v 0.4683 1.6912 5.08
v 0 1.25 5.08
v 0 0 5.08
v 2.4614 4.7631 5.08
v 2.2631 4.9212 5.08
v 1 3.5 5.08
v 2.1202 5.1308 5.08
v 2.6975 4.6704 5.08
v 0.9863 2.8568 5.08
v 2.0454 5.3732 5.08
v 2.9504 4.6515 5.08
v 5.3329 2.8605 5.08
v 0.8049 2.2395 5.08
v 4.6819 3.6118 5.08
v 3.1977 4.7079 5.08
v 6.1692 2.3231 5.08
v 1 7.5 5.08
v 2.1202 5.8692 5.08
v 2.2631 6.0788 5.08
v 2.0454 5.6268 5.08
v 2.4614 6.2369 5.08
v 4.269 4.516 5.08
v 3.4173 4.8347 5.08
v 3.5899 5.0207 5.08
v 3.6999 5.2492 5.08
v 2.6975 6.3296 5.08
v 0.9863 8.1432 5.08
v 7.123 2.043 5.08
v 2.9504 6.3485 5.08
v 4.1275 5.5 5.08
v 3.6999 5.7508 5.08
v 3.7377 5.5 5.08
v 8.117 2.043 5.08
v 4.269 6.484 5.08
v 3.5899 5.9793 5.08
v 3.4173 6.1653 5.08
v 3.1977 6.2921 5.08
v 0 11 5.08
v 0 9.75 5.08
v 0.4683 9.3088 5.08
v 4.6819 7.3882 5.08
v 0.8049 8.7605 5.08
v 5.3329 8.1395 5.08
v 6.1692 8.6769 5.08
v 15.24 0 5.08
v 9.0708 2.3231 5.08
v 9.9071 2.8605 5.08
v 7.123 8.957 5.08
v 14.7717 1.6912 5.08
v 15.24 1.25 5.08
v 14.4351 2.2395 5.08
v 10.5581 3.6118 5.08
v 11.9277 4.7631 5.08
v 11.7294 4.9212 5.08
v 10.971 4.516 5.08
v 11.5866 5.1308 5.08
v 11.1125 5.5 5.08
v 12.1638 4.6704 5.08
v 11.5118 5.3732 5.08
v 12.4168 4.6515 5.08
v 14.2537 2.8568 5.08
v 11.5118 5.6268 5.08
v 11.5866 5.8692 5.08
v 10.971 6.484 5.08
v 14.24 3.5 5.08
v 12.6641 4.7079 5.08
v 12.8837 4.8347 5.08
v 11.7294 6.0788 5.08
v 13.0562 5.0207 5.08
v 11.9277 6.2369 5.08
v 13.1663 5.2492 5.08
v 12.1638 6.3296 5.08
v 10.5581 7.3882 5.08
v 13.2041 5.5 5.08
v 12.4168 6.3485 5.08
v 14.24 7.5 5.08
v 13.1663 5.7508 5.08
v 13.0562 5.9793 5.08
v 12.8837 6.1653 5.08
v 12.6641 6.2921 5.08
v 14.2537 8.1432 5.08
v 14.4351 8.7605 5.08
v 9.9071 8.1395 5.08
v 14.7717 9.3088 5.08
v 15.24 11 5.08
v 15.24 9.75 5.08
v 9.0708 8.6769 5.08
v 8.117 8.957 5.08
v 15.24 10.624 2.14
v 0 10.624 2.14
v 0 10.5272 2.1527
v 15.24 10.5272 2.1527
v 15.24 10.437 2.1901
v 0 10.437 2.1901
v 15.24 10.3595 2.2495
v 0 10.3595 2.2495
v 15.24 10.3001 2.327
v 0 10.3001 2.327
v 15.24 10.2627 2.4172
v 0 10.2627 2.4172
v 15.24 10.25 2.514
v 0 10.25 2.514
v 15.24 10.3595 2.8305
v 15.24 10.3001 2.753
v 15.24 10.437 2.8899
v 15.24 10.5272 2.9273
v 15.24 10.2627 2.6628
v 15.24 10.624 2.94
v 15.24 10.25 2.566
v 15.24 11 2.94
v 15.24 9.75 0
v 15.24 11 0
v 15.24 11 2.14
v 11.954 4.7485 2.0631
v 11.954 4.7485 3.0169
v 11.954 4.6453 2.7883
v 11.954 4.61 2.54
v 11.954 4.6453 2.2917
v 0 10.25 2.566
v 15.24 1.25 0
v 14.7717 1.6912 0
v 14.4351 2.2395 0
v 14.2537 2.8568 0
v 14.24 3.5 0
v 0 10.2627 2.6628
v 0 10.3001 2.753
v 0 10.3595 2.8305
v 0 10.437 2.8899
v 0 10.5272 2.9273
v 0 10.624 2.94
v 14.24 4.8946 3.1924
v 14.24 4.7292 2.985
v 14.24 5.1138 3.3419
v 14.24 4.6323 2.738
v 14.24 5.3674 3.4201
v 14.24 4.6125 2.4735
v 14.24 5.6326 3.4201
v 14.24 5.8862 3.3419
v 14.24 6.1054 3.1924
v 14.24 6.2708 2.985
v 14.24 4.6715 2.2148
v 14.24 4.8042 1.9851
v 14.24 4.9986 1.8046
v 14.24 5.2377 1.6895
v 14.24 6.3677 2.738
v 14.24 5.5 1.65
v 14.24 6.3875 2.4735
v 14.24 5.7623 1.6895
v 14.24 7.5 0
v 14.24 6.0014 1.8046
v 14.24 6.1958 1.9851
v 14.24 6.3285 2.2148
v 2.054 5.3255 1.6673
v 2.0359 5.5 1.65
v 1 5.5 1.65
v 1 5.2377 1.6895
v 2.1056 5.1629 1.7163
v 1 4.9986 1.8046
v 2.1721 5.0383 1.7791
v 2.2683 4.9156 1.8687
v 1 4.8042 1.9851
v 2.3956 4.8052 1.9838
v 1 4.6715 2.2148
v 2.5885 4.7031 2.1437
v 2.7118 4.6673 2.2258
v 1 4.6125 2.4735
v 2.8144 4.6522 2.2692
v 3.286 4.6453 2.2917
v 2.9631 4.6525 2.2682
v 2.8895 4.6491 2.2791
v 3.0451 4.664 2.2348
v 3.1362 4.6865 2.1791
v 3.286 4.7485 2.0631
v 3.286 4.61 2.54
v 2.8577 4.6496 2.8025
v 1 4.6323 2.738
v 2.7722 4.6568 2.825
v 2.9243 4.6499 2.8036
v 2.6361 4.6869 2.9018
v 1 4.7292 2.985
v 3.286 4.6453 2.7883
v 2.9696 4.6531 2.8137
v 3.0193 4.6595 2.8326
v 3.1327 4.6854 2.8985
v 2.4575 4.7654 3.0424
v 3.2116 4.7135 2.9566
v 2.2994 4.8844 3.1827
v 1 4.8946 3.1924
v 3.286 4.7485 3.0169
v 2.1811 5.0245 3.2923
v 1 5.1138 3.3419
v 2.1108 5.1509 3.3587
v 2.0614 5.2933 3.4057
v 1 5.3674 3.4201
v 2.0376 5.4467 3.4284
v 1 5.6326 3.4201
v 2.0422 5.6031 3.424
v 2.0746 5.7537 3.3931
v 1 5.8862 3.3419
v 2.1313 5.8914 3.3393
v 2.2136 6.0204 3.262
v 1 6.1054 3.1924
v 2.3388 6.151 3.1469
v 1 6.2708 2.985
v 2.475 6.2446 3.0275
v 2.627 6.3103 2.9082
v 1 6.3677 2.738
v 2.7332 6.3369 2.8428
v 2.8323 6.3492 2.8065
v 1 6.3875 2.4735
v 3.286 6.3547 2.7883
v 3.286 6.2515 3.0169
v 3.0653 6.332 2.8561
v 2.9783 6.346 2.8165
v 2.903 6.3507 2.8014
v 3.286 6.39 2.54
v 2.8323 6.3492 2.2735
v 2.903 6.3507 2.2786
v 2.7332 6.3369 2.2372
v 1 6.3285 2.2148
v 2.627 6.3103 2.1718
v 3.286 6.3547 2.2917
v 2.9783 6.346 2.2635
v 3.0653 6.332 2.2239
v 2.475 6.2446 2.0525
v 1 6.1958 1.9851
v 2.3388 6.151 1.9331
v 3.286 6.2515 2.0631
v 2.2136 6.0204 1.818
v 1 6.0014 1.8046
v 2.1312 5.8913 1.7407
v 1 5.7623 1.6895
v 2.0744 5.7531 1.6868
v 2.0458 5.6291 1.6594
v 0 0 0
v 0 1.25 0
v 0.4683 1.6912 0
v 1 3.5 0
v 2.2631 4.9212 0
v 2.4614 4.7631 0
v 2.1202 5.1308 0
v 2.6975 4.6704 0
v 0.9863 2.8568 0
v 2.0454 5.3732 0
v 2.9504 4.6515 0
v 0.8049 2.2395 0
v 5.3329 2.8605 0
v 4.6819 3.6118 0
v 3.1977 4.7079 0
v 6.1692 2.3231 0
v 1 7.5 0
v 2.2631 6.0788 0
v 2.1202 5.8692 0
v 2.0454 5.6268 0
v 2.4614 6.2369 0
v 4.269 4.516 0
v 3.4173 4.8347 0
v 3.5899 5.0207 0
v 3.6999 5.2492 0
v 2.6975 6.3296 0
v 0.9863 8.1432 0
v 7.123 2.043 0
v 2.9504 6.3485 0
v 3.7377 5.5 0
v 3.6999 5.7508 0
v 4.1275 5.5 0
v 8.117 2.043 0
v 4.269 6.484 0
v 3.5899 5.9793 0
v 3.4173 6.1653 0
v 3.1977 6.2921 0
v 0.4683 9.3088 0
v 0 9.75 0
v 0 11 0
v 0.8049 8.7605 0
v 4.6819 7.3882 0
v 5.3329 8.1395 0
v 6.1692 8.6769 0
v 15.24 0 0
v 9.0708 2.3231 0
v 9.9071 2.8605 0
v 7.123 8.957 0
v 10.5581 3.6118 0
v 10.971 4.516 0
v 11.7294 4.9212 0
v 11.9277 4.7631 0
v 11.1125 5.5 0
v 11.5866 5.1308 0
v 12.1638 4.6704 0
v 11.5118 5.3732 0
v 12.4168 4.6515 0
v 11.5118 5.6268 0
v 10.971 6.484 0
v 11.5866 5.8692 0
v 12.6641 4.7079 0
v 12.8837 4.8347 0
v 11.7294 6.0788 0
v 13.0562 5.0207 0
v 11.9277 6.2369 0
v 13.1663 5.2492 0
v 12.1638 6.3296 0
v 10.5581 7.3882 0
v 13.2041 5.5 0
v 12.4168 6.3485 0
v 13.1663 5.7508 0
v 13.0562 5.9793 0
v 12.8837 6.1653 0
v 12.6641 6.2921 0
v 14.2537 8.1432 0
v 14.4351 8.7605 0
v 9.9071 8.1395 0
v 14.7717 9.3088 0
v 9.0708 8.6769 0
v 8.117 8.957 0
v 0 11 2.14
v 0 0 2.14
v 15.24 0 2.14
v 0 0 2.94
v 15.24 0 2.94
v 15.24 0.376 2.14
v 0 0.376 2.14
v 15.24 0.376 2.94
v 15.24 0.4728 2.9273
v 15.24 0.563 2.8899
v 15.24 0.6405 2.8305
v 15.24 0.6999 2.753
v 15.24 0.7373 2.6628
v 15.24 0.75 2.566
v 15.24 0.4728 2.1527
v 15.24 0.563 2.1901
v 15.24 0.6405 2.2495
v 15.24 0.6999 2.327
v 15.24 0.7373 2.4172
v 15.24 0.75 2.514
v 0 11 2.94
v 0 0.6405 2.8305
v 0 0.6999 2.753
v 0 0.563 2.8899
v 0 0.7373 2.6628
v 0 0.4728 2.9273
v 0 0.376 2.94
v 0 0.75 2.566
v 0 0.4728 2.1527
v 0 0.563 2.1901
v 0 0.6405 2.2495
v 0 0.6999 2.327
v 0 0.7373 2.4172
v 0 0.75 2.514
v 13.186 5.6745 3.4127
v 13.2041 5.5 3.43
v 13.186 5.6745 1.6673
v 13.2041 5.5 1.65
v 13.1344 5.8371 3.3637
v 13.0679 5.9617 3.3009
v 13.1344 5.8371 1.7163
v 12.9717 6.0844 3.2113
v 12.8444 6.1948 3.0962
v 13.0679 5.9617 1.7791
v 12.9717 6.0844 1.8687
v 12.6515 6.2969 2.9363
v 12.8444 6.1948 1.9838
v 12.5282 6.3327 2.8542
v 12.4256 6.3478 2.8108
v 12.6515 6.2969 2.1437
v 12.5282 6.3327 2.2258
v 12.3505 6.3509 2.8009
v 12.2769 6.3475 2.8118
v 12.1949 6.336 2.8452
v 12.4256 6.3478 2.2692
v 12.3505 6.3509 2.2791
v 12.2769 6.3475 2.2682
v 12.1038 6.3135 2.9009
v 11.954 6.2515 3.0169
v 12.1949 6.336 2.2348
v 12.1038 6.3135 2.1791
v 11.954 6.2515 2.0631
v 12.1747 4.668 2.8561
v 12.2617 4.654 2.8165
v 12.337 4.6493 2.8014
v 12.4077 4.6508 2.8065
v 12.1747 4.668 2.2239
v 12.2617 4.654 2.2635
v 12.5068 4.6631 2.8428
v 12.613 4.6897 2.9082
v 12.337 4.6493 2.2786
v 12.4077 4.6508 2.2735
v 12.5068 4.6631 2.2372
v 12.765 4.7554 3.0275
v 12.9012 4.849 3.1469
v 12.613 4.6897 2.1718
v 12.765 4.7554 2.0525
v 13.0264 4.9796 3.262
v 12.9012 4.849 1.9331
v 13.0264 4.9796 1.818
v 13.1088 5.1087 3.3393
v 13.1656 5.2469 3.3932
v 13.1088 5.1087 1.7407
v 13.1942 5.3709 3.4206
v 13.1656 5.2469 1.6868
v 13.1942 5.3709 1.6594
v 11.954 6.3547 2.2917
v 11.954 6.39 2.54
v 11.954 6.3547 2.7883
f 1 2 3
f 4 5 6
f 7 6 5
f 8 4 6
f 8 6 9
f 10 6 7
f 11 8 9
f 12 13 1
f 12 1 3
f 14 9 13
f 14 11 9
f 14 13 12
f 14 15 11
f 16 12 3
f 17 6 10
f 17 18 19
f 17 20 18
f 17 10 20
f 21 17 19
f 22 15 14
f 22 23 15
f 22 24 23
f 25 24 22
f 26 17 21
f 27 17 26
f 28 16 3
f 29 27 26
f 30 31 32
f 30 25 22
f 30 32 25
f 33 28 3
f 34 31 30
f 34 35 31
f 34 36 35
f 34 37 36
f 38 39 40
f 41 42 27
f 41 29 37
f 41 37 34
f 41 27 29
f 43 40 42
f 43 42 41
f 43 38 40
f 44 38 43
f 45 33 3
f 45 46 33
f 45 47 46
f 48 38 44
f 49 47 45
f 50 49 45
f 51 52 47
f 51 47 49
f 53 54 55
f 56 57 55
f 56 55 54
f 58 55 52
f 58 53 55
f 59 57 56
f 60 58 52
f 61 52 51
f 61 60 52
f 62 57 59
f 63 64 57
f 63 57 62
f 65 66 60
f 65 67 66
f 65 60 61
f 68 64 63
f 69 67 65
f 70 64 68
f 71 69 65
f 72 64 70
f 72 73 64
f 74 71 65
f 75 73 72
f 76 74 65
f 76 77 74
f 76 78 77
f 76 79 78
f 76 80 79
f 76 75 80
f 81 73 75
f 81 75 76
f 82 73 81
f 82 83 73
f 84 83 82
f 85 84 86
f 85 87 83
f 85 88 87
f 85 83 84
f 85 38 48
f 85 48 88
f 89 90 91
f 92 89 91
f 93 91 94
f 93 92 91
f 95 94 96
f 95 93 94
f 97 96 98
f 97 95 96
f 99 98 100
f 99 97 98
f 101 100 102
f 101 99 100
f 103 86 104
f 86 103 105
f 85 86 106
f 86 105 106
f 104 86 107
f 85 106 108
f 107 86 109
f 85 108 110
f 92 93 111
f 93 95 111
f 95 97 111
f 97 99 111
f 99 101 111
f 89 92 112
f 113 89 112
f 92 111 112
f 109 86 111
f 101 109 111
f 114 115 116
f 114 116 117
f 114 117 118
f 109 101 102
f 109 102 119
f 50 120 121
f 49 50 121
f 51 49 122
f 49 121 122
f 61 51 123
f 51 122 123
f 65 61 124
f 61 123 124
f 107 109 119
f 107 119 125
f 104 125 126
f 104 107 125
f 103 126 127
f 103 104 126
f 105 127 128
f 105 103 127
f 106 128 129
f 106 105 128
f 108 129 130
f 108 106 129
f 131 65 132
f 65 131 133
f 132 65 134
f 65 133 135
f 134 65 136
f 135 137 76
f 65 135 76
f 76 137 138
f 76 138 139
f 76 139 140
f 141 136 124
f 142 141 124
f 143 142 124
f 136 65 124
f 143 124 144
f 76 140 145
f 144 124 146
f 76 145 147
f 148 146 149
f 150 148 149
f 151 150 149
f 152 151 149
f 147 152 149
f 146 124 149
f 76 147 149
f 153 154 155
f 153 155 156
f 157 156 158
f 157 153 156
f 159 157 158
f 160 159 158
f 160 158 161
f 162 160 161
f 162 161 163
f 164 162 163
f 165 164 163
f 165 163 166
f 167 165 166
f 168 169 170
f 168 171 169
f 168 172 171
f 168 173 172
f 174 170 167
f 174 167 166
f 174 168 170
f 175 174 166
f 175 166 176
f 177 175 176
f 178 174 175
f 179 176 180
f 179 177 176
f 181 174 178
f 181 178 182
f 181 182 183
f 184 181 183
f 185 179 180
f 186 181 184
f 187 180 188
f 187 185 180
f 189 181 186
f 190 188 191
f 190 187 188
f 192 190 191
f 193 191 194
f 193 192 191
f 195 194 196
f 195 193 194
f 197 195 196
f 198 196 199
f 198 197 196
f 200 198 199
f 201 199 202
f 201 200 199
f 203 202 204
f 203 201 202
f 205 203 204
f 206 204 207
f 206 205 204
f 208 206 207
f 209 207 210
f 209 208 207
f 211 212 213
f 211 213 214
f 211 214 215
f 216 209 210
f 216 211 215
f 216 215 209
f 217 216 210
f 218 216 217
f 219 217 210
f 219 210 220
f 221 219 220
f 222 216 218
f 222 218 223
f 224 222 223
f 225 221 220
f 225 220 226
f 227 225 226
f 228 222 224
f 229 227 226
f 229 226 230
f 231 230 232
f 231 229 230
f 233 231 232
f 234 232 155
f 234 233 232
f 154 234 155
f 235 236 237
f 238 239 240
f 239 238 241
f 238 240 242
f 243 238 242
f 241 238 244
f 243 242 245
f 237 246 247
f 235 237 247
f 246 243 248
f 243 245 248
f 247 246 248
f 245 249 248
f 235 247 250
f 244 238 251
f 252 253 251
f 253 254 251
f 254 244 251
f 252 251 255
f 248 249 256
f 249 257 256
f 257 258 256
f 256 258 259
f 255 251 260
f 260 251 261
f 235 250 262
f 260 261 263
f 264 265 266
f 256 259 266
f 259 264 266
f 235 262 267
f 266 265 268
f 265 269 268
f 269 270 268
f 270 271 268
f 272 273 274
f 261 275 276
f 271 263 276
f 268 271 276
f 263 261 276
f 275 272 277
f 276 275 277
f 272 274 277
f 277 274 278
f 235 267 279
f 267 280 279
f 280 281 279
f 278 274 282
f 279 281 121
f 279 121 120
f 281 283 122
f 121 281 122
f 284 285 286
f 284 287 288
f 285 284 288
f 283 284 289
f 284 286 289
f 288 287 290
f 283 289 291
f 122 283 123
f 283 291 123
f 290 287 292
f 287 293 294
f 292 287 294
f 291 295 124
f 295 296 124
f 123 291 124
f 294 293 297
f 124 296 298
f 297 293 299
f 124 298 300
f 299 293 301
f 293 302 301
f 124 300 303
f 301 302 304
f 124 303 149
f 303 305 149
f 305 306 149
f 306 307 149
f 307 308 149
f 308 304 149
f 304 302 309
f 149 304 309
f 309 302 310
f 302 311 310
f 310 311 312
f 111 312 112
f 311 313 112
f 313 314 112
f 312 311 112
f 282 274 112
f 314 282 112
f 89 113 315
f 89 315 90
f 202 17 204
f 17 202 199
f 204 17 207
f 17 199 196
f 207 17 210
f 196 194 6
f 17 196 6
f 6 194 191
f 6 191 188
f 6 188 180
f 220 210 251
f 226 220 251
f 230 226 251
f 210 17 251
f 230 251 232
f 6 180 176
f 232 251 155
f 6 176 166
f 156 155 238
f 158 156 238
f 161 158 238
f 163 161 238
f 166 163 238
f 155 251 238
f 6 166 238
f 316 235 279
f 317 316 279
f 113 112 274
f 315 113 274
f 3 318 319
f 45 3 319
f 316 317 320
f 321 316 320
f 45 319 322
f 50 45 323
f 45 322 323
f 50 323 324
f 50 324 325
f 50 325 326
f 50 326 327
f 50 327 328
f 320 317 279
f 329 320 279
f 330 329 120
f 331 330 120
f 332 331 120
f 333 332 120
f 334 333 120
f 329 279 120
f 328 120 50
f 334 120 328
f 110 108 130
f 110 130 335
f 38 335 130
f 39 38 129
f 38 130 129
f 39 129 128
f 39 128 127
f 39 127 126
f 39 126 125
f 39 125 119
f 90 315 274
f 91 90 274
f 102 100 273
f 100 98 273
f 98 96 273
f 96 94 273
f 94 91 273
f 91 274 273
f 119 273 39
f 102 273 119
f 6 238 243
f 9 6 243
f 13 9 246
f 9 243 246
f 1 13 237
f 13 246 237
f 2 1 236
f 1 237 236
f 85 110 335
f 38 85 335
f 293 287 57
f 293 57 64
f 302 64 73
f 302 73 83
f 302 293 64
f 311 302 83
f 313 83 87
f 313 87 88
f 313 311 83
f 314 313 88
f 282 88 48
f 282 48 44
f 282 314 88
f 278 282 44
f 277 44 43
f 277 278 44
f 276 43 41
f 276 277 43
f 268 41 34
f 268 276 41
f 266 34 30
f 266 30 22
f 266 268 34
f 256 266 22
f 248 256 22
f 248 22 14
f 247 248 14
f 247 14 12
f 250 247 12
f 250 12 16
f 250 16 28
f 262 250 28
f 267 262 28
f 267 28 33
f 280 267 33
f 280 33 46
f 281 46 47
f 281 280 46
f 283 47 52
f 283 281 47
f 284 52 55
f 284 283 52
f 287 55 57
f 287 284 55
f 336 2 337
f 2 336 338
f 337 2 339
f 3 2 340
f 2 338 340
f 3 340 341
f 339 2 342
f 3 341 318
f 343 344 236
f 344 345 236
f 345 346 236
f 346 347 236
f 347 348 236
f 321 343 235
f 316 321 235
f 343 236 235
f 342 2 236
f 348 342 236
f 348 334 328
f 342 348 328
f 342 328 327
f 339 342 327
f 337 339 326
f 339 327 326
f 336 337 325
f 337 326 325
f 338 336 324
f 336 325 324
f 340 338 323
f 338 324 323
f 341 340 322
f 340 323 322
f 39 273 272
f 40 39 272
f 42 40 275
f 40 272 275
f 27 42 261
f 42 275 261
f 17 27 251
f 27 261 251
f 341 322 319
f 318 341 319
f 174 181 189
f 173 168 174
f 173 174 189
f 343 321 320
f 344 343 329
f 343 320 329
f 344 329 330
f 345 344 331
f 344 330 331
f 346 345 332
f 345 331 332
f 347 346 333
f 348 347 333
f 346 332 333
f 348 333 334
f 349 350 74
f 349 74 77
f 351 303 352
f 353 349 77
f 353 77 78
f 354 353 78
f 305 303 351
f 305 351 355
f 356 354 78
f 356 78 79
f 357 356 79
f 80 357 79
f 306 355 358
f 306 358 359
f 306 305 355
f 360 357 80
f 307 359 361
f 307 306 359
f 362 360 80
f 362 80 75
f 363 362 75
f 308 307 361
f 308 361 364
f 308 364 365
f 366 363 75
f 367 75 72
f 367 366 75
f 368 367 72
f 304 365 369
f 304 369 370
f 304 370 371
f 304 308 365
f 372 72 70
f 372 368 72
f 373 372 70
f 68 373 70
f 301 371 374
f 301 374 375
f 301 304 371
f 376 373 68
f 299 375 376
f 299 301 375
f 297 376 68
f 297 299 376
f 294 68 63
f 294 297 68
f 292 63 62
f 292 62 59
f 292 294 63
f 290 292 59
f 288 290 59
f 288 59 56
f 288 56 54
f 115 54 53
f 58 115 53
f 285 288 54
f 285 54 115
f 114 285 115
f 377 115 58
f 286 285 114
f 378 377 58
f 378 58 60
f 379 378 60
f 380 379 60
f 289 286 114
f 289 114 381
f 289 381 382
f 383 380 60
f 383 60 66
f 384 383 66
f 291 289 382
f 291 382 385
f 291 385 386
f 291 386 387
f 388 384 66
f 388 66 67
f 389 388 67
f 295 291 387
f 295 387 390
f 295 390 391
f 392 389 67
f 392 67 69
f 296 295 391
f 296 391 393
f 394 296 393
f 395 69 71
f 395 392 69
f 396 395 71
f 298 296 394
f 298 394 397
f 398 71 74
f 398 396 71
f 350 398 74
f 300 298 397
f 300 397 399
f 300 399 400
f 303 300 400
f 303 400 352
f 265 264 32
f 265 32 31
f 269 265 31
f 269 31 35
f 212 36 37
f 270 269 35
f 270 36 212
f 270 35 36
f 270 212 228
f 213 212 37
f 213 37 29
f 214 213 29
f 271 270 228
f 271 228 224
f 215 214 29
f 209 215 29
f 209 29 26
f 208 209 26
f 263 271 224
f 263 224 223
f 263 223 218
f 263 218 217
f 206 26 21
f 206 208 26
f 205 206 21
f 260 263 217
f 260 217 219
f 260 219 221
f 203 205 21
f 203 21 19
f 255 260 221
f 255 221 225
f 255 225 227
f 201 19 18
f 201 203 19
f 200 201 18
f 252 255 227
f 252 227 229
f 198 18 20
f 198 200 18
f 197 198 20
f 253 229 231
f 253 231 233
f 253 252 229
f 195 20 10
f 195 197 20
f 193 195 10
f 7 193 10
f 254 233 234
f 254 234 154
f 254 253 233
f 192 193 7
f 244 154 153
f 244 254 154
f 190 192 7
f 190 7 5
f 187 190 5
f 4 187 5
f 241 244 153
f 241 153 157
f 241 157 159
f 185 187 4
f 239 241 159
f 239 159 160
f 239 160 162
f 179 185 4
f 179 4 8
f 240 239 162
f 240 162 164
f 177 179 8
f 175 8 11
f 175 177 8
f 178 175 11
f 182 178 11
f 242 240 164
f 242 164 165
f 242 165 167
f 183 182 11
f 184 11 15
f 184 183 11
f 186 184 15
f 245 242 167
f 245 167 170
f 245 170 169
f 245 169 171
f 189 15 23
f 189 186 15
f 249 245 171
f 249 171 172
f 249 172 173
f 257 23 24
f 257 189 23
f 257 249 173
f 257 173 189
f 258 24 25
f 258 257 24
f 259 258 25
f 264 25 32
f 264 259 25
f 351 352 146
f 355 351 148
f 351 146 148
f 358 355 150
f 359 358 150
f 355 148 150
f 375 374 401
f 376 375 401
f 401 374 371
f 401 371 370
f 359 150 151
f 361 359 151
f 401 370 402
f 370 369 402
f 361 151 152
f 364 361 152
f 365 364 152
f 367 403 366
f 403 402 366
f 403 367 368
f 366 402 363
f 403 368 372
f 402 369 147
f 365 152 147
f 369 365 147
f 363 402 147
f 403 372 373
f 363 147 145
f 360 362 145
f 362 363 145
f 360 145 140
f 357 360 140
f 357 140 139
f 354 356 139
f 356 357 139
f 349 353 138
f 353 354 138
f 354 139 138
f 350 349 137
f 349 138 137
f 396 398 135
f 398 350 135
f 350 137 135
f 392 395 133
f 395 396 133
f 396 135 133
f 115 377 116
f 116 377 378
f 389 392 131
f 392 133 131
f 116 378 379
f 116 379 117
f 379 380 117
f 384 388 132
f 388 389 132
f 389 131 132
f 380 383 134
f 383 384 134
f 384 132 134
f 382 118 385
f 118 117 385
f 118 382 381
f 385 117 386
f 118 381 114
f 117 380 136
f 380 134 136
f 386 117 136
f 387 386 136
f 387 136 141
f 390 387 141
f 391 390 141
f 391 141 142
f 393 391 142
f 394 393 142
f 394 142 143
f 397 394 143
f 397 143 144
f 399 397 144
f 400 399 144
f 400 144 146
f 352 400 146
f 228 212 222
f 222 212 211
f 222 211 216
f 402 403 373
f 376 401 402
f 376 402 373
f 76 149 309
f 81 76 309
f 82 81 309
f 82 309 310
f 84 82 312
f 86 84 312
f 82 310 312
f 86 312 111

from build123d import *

# Parameters (mm, degrees)
SKETCH1_R           = 0.8509
SKETCH1_R_2         = 3.4925
BOSS_EXTRUDE1_DEPTH = 5.08
SKETCH2_R           = 0.89
CUT_EXTRUDE1_DEPTH  = 2.286
CUT_EXTRUDE2_START  = -2.286
SKETCH3_R           = 0.89
CUT_EXTRUDE2_DEPTH  = 2.286
CUT_EXTRUDE3_DEPTH  = 20.46956602


with BuildPart() as part:
    # Sketch1 → Boss-Extrude1 (new body)
    with BuildSketch(Plane.XY):
        with BuildLine():
            ThreePointArc((0, 9.75), (0.804883509, 8.760503782), (1, 7.5))
            Line((1, 7.5), (1, 3.5))
            ThreePointArc((1, 3.5), (0.804883509, 2.239496218), (0, 1.25))
            Line((0, 1.25), (0, 0))
            Line((0, 0), (15.24, 0))
            Line((15.24, 0), (15.24, 1.25))
            ThreePointArc((15.24, 1.25), (14.435116491, 2.239496218), (14.24, 3.5))
            Line((14.24, 3.5), (14.24, 7.5))
            ThreePointArc((14.24, 7.5), (14.435116491, 8.760503782), (15.24, 9.75))
            Line((15.24, 9.75), (15.24, 11))
            Line((15.24, 11), (0, 11))
            Line((0, 11), (0, 9.75))
        make_face()
        with Locations((2.886809291, 5.5)):
            Circle(SKETCH1_R, mode=Mode.SUBTRACT)
        with Locations((7.62, 5.5)):
            Circle(SKETCH1_R_2, mode=Mode.SUBTRACT)
        with Locations((12.353190709, 5.5)):
            Circle(SKETCH1_R, mode=Mode.SUBTRACT)
    extrude(amount=BOSS_EXTRUDE1_DEPTH)

    # Sketch2 → Cut-Extrude1 (cut)
    with BuildSketch(Plane(origin=(14.24, 0, 0), x_dir=(0, 0, -1), z_dir=(1, 0, 0))):
        with Locations((-2.54, 5.5)):
            Circle(SKETCH2_R)
    extrude(amount=-CUT_EXTRUDE1_DEPTH, mode=Mode.SUBTRACT)

    # Sketch3 → Cut-Extrude2 (cut)
    with BuildSketch(Plane.ZY.offset(-1).offset(CUT_EXTRUDE2_START)):
        with Locations(Location((2.54, 5.5, 0), (0, 0, 180))):
            Circle(SKETCH3_R)
    extrude(amount=CUT_EXTRUDE2_DEPTH, mode=Mode.SUBTRACT)

    # Sketch4 → Cut-Extrude3 (cut, through all)
    with BuildSketch(Plane(origin=(15.24, 0, 0), x_dir=(0, 0, -1), z_dir=(1, 0, 0))):
        with BuildLine():
            Line((-2.94, 0), (-2.14, 0))
            Line((-2.14, 0), (-2.14, 0.376))
            ThreePointArc((-2.14, 0.376), (-2.249542064, 0.640457936), (-2.514, 0.75))
            Line((-2.514, 0.75), (-2.566, 0.75))
            ThreePointArc((-2.566, 0.75), (-2.830457936, 0.640457936), (-2.94, 0.376))
            Line((-2.94, 0.376), (-2.94, 0))
        make_face()
    cut_extrude3 = extrude(amount=-CUT_EXTRUDE3_DEPTH, mode=Mode.SUBTRACT)

    # Mirror1: Cut-Extrude3 across plane
    add(cut_extrude3.mirror(Plane(origin=(0, 5.5, 0), x_dir=(0, 0, 1), z_dir=(0, -1, 0))), mode=Mode.SUBTRACT)


solid = part.part
